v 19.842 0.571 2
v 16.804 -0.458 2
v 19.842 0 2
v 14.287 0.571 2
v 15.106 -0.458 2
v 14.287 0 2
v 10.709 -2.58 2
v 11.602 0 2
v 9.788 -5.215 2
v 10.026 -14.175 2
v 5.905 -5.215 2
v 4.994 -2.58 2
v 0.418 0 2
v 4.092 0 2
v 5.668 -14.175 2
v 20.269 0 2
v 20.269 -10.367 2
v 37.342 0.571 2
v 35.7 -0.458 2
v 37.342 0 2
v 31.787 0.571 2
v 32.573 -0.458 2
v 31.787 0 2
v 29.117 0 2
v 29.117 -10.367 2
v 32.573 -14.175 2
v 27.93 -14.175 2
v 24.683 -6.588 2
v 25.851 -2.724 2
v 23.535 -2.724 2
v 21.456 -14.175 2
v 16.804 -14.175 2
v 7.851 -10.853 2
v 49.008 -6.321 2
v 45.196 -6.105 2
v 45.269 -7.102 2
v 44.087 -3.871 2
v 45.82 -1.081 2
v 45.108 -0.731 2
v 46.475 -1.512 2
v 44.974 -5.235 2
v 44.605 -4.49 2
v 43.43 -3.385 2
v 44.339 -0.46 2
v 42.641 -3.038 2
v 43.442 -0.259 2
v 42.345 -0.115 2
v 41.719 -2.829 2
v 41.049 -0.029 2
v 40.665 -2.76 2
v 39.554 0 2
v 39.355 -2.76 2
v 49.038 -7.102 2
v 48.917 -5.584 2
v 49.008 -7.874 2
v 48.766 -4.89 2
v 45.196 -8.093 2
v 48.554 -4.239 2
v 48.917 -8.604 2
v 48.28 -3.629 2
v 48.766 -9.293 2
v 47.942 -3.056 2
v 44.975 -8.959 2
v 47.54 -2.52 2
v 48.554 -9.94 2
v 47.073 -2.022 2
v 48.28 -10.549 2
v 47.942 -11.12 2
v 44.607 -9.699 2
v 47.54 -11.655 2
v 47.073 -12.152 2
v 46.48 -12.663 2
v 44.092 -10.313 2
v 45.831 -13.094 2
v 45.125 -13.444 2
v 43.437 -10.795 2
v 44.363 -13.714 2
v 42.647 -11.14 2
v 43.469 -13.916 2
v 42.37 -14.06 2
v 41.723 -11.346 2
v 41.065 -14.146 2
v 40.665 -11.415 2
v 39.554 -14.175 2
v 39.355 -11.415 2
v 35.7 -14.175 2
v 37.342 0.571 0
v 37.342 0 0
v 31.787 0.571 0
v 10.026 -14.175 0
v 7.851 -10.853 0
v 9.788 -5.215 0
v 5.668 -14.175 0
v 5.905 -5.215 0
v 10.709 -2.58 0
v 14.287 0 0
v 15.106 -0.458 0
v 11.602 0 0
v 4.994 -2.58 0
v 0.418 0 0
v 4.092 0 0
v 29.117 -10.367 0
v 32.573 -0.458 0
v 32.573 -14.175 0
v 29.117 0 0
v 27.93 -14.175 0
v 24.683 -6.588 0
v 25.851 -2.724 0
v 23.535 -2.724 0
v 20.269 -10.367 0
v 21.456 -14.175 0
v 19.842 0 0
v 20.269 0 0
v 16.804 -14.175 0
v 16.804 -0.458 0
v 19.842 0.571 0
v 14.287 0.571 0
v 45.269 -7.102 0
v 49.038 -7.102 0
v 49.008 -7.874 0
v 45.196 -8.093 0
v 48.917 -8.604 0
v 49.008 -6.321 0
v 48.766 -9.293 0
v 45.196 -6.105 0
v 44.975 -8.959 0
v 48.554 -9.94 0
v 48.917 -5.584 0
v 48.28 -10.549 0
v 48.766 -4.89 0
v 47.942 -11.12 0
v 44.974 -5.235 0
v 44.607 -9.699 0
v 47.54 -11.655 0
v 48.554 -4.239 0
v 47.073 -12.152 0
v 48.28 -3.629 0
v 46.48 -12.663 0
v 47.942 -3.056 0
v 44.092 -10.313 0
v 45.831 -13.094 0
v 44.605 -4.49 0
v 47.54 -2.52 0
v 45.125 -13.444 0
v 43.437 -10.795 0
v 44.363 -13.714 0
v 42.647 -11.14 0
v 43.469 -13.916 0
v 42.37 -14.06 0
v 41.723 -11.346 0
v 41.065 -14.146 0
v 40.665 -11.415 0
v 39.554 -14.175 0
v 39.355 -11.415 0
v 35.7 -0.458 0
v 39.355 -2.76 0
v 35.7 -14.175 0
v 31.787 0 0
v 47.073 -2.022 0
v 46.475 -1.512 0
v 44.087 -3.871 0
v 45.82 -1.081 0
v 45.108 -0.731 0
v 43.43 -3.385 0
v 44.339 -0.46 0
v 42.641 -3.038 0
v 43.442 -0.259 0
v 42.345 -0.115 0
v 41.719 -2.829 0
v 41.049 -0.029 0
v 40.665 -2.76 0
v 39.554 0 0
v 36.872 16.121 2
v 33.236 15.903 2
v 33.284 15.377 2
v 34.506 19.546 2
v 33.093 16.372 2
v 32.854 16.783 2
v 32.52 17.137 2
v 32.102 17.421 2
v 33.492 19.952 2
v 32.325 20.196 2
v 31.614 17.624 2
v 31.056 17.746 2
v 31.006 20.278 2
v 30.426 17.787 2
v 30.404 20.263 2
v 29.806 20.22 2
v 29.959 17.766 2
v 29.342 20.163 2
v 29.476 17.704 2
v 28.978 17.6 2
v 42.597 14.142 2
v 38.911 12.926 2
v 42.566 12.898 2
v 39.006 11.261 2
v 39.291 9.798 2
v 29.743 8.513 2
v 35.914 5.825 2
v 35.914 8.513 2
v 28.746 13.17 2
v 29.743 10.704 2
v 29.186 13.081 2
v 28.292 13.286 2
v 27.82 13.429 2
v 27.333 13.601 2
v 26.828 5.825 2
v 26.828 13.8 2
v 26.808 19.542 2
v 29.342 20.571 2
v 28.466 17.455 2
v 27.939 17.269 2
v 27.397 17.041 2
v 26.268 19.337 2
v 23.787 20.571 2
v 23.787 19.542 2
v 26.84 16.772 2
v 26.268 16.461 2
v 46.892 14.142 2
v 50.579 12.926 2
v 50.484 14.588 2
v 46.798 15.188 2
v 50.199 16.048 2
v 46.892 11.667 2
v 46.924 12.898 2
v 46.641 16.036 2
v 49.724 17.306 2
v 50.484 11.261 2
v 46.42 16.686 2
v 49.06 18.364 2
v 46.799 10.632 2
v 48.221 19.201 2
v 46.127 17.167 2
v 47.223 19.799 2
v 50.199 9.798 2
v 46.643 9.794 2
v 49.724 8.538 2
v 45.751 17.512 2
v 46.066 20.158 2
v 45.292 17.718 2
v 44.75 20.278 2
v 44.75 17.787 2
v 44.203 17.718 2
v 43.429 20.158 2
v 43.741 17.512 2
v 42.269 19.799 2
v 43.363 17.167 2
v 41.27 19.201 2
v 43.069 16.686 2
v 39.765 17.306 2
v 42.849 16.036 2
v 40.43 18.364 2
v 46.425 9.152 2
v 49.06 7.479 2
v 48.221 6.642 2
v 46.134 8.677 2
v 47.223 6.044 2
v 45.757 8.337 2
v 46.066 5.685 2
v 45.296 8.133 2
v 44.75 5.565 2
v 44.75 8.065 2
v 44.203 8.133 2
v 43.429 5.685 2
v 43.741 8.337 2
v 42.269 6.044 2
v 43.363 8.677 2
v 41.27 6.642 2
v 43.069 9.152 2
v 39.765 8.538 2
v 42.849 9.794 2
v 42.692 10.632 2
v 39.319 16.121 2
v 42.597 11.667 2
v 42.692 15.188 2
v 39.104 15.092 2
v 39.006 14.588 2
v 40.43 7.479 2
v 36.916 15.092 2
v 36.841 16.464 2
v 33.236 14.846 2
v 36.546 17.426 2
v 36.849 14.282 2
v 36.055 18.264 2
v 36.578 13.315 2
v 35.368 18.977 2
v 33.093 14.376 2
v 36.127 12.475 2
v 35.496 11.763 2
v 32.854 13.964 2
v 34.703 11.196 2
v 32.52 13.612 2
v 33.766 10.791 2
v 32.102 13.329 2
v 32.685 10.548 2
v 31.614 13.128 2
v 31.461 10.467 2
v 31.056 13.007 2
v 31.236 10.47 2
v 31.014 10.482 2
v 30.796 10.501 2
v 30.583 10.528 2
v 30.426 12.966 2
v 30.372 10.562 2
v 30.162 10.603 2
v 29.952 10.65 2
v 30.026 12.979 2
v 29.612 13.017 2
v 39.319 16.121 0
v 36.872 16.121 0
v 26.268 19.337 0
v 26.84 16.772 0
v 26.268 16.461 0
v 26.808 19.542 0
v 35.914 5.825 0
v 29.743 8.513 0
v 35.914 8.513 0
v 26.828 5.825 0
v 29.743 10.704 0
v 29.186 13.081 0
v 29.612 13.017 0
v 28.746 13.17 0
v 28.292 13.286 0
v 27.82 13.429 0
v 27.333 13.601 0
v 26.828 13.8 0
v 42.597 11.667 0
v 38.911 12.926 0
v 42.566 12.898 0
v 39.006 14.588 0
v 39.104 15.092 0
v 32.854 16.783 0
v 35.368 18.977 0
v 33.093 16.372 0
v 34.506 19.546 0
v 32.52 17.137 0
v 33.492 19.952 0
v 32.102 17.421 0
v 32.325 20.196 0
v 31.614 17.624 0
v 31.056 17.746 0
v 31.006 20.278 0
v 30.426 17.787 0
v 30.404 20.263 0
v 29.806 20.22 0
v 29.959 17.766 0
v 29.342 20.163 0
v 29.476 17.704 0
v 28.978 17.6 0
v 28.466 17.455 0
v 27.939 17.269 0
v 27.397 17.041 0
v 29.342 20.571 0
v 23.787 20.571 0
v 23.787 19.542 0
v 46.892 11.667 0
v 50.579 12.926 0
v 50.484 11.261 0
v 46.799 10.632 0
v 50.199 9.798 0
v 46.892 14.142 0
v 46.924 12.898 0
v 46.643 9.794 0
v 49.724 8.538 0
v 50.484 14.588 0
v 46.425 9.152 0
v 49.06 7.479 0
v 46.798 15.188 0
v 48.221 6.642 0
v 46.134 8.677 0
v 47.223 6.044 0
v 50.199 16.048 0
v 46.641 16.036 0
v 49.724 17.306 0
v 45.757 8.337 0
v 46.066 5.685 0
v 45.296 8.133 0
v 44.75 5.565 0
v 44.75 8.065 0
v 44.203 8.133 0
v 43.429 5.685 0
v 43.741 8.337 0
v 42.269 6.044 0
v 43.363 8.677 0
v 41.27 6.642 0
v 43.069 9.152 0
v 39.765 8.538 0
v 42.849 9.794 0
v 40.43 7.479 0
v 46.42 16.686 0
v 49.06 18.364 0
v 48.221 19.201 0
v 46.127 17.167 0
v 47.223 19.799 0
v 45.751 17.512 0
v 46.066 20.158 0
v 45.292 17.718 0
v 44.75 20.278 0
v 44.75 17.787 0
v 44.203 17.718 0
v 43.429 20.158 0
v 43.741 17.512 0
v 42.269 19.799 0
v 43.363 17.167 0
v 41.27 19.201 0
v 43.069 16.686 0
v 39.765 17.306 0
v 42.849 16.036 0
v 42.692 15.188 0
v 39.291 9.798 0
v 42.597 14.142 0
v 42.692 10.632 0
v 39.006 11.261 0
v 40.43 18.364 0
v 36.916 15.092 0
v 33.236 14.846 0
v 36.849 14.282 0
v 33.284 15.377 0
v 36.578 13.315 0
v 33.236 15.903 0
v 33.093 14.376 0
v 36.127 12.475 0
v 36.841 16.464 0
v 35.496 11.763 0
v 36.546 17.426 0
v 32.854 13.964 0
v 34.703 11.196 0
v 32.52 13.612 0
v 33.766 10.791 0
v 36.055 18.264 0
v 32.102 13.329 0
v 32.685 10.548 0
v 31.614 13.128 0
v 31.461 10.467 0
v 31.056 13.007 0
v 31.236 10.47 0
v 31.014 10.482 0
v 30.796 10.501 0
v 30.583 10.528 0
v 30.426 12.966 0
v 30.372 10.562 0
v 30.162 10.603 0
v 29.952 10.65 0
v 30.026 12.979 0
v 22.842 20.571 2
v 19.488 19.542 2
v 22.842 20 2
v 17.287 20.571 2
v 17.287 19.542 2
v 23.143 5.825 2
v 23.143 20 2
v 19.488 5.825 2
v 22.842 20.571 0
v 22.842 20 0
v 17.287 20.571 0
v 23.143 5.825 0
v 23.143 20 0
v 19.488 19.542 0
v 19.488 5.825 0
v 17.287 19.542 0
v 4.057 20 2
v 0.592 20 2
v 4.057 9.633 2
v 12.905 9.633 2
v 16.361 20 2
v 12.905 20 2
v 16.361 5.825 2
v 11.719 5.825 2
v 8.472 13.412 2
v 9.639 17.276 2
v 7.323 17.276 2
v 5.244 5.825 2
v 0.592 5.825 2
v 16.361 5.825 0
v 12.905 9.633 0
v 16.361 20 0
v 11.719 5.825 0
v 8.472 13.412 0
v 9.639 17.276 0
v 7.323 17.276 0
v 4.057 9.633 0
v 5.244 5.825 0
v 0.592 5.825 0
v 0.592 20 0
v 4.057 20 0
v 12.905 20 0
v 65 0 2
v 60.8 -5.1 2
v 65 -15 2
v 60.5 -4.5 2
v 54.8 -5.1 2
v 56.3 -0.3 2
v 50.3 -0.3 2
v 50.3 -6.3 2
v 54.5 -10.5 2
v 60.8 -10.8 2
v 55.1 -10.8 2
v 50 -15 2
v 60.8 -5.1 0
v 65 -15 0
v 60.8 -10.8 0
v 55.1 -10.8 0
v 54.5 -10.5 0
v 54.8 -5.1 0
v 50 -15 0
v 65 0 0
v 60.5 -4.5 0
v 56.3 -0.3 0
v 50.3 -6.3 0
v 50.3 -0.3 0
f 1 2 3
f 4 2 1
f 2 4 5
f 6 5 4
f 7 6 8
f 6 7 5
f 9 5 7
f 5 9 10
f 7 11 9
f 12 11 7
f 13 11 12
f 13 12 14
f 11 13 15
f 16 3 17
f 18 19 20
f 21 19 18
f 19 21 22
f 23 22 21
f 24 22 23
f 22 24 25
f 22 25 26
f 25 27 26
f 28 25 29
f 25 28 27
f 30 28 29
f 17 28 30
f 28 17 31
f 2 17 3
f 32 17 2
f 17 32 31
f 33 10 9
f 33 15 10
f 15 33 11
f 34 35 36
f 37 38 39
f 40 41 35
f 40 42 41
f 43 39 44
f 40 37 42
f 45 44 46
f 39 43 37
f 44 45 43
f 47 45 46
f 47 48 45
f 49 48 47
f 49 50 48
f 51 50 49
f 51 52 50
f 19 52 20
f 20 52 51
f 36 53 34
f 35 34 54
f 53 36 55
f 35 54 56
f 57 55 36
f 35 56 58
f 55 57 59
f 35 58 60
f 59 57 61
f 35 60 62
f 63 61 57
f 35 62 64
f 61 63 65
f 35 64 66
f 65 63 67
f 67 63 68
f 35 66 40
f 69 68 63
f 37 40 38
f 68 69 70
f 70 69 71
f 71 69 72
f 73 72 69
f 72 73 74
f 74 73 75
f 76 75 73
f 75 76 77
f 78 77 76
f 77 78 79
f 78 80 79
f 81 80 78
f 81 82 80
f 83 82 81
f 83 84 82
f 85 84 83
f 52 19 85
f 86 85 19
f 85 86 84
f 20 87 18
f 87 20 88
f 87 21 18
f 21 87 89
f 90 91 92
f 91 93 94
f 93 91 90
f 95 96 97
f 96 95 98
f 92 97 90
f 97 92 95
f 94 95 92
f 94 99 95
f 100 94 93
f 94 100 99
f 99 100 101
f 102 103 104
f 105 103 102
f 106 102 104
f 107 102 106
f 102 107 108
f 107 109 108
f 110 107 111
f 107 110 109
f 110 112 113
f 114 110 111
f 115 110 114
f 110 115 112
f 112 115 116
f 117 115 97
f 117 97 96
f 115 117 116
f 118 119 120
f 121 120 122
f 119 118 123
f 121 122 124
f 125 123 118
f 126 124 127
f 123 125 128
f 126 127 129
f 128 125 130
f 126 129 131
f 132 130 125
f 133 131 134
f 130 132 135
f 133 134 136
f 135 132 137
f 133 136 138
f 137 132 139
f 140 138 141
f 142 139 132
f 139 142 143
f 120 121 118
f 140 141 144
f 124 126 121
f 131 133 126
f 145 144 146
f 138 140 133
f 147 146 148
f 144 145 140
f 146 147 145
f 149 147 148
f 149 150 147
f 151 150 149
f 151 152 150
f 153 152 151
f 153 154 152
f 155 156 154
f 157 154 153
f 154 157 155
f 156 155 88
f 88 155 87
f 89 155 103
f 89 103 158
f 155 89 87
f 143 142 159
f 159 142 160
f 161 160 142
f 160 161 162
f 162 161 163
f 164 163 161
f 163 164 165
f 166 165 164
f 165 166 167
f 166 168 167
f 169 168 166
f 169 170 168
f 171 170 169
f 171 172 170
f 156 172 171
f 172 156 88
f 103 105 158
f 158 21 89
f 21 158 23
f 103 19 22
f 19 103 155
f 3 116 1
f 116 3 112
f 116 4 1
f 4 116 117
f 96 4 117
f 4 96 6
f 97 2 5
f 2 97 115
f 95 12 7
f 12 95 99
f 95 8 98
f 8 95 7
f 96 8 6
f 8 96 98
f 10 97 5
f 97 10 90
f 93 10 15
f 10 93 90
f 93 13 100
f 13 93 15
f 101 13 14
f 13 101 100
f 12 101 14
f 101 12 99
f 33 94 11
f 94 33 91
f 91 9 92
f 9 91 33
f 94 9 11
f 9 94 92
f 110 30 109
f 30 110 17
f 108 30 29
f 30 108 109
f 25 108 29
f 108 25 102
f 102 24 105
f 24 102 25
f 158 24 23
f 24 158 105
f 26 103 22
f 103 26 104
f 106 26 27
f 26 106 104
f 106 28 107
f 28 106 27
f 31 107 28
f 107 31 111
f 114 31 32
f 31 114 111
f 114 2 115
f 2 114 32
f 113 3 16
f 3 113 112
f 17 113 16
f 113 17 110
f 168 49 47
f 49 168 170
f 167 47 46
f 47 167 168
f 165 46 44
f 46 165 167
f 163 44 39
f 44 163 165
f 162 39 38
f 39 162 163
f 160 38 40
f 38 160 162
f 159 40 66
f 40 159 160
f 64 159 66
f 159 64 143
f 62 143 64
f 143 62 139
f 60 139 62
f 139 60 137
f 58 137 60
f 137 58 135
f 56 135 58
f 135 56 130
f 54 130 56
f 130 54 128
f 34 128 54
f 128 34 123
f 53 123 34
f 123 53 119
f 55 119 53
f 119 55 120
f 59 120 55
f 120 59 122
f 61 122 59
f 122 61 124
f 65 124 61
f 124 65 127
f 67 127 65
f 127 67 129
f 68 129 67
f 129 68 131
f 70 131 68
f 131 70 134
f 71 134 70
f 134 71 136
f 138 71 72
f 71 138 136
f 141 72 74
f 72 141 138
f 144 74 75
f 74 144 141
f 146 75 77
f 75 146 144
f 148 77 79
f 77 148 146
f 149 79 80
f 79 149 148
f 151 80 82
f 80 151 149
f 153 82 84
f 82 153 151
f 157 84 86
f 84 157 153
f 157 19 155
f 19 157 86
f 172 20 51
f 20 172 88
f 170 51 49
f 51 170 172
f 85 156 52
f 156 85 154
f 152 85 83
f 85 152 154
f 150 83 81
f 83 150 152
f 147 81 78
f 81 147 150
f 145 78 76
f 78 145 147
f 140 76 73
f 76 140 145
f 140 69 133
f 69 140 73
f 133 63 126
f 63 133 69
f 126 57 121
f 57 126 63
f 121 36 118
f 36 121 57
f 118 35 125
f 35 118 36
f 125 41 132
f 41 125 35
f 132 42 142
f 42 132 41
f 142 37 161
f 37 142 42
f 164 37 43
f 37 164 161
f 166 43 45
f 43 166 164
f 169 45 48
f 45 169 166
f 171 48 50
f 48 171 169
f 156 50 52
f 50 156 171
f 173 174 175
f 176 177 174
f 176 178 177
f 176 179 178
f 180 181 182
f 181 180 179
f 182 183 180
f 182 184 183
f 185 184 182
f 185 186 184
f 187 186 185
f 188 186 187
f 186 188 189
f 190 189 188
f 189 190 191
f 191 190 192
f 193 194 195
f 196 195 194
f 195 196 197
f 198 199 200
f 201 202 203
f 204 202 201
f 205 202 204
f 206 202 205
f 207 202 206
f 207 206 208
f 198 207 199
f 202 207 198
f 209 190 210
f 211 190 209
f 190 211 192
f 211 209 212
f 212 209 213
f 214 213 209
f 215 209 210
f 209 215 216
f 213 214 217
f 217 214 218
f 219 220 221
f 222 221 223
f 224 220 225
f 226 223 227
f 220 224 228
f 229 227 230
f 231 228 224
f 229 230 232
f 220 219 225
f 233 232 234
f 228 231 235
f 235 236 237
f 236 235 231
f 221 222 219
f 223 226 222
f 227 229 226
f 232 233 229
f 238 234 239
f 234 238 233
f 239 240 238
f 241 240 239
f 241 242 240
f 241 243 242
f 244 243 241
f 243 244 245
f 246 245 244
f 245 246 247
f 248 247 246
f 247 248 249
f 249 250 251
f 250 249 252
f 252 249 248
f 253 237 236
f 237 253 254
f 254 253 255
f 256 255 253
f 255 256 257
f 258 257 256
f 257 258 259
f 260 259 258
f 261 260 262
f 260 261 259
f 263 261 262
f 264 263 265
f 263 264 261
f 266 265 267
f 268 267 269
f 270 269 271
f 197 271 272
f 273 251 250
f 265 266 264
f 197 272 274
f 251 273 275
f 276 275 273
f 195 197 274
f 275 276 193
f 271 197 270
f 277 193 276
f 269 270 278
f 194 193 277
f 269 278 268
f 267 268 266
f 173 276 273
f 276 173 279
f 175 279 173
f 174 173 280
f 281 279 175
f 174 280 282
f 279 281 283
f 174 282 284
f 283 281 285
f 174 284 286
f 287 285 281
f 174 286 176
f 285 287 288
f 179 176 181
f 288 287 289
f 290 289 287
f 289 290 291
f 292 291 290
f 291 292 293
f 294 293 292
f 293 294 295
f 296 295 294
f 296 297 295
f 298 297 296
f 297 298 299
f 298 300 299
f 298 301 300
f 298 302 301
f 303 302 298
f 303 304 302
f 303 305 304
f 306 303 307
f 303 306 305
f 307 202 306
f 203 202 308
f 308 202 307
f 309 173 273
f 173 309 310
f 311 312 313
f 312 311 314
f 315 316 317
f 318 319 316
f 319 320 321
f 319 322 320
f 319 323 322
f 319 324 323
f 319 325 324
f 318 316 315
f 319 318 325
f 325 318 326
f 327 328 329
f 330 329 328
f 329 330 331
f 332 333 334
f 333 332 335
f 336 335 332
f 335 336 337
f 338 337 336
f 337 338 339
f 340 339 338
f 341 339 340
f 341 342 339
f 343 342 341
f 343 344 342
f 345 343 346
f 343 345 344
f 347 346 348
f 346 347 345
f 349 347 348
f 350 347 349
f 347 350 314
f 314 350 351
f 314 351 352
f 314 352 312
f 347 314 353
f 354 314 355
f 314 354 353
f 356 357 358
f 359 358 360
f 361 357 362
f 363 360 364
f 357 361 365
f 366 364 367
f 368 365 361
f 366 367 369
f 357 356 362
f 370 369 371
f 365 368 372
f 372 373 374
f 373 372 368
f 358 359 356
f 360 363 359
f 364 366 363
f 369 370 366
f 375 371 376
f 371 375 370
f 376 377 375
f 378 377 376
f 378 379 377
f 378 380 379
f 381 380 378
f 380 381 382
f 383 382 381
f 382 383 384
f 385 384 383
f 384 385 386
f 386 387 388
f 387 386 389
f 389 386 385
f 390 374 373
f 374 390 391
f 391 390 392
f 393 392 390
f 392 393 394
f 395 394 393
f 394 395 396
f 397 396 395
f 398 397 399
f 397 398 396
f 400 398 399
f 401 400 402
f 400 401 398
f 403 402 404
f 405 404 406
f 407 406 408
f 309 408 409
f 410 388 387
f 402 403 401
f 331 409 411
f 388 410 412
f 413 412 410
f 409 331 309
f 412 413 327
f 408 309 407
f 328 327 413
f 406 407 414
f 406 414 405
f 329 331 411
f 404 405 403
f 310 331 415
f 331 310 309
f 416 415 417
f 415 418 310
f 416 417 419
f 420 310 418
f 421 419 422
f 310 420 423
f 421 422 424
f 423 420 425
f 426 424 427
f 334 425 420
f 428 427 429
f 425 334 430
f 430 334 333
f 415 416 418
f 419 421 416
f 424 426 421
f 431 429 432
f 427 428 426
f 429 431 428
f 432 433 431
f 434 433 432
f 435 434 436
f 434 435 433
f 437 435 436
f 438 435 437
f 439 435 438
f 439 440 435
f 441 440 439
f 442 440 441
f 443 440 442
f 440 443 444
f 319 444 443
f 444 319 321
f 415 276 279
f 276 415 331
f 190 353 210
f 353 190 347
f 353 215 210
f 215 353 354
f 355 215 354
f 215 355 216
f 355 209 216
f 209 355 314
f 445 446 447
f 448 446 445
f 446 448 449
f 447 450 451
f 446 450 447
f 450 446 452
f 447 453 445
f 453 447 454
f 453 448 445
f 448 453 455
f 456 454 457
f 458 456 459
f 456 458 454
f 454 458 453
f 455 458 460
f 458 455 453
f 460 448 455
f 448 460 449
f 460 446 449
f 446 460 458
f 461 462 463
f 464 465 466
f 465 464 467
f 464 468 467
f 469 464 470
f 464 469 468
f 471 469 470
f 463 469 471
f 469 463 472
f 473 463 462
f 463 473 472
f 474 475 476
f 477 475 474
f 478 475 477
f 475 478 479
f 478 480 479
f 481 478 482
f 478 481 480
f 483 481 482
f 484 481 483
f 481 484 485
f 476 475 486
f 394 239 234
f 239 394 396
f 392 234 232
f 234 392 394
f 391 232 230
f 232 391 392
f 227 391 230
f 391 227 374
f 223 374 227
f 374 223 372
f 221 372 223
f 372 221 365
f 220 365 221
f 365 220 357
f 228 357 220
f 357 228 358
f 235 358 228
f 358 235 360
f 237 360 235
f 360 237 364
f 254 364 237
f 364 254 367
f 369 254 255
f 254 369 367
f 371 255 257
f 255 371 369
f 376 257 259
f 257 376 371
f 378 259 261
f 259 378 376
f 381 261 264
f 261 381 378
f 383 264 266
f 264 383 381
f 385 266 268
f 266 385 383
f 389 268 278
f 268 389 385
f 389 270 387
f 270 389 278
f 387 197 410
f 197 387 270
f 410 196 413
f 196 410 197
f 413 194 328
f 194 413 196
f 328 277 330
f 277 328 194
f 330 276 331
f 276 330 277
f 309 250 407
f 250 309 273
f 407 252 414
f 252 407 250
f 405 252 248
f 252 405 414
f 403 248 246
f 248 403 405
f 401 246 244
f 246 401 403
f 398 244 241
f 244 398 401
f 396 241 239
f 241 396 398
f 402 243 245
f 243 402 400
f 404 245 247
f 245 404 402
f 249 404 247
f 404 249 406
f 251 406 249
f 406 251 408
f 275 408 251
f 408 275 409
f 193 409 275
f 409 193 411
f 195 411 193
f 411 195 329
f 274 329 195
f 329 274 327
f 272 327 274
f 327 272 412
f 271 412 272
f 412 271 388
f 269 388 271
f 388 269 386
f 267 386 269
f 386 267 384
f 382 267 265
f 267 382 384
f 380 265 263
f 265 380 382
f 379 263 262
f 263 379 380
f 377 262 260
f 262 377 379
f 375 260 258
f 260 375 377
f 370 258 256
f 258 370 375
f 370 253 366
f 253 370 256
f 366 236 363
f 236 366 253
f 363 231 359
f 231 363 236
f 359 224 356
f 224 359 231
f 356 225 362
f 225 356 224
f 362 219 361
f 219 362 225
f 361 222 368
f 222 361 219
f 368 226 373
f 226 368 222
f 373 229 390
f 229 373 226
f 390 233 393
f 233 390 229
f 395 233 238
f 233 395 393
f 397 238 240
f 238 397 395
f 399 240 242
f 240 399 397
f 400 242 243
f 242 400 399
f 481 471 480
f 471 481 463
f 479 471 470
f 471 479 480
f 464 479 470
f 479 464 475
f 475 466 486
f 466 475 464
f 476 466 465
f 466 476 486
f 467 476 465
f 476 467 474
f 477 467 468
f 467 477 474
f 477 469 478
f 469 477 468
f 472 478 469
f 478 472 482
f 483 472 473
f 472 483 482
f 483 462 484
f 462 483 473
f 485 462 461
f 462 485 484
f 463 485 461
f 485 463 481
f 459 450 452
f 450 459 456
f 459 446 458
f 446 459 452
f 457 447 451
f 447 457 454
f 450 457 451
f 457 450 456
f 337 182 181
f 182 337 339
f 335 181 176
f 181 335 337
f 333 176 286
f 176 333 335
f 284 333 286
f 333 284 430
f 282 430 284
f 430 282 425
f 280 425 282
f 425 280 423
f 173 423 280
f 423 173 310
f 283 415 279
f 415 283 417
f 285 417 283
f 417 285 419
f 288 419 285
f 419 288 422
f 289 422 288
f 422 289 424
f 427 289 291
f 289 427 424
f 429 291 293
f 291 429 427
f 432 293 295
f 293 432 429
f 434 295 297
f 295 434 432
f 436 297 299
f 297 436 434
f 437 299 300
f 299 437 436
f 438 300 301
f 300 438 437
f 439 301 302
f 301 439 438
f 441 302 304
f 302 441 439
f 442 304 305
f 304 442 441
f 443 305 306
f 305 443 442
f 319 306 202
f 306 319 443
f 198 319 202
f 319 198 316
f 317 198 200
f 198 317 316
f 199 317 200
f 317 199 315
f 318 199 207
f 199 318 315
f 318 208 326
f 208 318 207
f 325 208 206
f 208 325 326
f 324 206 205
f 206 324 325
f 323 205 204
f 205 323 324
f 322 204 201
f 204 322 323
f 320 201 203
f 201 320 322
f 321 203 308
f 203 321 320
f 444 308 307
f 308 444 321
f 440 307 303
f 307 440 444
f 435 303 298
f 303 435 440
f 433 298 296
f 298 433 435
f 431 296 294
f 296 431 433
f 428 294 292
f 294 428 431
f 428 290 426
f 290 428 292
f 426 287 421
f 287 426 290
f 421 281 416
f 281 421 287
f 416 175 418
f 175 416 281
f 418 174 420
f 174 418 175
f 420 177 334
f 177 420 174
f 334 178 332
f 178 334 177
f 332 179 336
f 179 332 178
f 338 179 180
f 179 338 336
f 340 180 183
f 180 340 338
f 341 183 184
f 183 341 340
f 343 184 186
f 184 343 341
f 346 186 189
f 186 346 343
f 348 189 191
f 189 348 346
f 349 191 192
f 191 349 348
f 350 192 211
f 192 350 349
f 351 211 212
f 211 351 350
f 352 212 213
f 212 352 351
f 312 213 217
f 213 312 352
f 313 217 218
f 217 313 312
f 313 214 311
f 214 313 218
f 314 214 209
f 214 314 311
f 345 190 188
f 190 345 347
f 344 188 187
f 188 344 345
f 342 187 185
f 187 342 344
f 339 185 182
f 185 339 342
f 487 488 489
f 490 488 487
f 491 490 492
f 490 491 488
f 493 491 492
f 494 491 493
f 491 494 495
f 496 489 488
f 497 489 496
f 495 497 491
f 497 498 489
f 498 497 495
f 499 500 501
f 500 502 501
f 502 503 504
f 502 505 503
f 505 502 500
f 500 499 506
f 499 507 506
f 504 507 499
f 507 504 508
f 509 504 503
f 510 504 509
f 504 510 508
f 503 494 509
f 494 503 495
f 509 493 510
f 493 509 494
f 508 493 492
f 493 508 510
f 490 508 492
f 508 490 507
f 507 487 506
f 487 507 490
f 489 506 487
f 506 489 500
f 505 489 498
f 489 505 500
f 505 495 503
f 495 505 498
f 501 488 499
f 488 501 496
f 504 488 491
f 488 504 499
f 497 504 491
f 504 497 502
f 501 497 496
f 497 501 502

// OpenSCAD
// Global Parameters
global_th = 2;

module amd_logo(size=50, th=2) {
    s = size / 100; 
    scale_val = 0.30;
  
    // Added translate [0, 0, th] to bring base to Z=0
    translate([0, 0, th])
    color("#222")
    rotate([0, 180, 0])
    scale([scale_val, scale_val, 1]) 
    linear_extrude(height = th) 
    {
        difference() {
            union () 
            {
                polygon(points=[
                    [0*s, 0*s],   
                    [0*s, 100*s], 
                    [100*s, 0*s]  
                ]);
                
                translate([-1, -1, 0])
                polygon(points=[
                    [30*s, 30*s], 
                    [70*s, 30*s],
                    [100*s, 60*s],
                    [100*s,100*s],
                    [60*s, 100*s],
                    [30*s, 70*s]
                ]);
            }
            
            translate([-1, -1, 0])
            polygon(points=[
                    [30*s, 30*s], 
                    [68*s, 30*s],
                    [70*s, 68*s],
                    [30*s, 68*s]
                ]);
        }
    }
}

module letters_AMD(th=2) {
    translate([25, 0, th])
    rotate([180, 0, 0]) 
    {
        color("#222") linear_extrude(height = th) { 
            text("AMD", size = 14, font = "Cascadia:style=Bold", halign = "center"); 
        }
        color("#888") {
            translate([9.5, 2.05, 0]) linear_extrude(height = th) { text("_", size = 8, font = "Ubuntu:style=Bold", halign = "center"); }
            translate([-8, 2.05, 0]) linear_extrude(height = th) { text("_", size = 8, font = "Ubuntu:style=Bold", halign = "center"); }
        }
    }
}

module letters_MI (th=2) {
    translate([25, 0, th]) 
    rotate([180, 0, 0]) {
        color("#222")
        linear_extrude(height = th) {
            text("MI50", size = 14, font = "Cascadia:style=Bold", halign = "center");
        }
        
        color("#888")
        union () {
            translate([12, 6.5, 0]) linear_extrude(height = th)   { text("_", size = 8, font = "Ubuntu:style=Bold", halign = "center"); }
            translate([1.5, 2.05, 0]) linear_extrude(height = th) { text("_", size = 8, font = "Ubuntu:style=Bold", halign = "center"); }
            translate([-5, 2.05, 0]) linear_extrude(height = th)  { text("_", size = 8, font = "Ubuntu:style=Bold", halign = "center"); }
        }
    }
}

// Main Assembly
union() {
    letters_AMD(th=global_th);
    
    translate([0, 20, 0])
    letters_MI(th=global_th);
    
    translate([65, -15, 0])
    amd_logo(th=global_th);
}
